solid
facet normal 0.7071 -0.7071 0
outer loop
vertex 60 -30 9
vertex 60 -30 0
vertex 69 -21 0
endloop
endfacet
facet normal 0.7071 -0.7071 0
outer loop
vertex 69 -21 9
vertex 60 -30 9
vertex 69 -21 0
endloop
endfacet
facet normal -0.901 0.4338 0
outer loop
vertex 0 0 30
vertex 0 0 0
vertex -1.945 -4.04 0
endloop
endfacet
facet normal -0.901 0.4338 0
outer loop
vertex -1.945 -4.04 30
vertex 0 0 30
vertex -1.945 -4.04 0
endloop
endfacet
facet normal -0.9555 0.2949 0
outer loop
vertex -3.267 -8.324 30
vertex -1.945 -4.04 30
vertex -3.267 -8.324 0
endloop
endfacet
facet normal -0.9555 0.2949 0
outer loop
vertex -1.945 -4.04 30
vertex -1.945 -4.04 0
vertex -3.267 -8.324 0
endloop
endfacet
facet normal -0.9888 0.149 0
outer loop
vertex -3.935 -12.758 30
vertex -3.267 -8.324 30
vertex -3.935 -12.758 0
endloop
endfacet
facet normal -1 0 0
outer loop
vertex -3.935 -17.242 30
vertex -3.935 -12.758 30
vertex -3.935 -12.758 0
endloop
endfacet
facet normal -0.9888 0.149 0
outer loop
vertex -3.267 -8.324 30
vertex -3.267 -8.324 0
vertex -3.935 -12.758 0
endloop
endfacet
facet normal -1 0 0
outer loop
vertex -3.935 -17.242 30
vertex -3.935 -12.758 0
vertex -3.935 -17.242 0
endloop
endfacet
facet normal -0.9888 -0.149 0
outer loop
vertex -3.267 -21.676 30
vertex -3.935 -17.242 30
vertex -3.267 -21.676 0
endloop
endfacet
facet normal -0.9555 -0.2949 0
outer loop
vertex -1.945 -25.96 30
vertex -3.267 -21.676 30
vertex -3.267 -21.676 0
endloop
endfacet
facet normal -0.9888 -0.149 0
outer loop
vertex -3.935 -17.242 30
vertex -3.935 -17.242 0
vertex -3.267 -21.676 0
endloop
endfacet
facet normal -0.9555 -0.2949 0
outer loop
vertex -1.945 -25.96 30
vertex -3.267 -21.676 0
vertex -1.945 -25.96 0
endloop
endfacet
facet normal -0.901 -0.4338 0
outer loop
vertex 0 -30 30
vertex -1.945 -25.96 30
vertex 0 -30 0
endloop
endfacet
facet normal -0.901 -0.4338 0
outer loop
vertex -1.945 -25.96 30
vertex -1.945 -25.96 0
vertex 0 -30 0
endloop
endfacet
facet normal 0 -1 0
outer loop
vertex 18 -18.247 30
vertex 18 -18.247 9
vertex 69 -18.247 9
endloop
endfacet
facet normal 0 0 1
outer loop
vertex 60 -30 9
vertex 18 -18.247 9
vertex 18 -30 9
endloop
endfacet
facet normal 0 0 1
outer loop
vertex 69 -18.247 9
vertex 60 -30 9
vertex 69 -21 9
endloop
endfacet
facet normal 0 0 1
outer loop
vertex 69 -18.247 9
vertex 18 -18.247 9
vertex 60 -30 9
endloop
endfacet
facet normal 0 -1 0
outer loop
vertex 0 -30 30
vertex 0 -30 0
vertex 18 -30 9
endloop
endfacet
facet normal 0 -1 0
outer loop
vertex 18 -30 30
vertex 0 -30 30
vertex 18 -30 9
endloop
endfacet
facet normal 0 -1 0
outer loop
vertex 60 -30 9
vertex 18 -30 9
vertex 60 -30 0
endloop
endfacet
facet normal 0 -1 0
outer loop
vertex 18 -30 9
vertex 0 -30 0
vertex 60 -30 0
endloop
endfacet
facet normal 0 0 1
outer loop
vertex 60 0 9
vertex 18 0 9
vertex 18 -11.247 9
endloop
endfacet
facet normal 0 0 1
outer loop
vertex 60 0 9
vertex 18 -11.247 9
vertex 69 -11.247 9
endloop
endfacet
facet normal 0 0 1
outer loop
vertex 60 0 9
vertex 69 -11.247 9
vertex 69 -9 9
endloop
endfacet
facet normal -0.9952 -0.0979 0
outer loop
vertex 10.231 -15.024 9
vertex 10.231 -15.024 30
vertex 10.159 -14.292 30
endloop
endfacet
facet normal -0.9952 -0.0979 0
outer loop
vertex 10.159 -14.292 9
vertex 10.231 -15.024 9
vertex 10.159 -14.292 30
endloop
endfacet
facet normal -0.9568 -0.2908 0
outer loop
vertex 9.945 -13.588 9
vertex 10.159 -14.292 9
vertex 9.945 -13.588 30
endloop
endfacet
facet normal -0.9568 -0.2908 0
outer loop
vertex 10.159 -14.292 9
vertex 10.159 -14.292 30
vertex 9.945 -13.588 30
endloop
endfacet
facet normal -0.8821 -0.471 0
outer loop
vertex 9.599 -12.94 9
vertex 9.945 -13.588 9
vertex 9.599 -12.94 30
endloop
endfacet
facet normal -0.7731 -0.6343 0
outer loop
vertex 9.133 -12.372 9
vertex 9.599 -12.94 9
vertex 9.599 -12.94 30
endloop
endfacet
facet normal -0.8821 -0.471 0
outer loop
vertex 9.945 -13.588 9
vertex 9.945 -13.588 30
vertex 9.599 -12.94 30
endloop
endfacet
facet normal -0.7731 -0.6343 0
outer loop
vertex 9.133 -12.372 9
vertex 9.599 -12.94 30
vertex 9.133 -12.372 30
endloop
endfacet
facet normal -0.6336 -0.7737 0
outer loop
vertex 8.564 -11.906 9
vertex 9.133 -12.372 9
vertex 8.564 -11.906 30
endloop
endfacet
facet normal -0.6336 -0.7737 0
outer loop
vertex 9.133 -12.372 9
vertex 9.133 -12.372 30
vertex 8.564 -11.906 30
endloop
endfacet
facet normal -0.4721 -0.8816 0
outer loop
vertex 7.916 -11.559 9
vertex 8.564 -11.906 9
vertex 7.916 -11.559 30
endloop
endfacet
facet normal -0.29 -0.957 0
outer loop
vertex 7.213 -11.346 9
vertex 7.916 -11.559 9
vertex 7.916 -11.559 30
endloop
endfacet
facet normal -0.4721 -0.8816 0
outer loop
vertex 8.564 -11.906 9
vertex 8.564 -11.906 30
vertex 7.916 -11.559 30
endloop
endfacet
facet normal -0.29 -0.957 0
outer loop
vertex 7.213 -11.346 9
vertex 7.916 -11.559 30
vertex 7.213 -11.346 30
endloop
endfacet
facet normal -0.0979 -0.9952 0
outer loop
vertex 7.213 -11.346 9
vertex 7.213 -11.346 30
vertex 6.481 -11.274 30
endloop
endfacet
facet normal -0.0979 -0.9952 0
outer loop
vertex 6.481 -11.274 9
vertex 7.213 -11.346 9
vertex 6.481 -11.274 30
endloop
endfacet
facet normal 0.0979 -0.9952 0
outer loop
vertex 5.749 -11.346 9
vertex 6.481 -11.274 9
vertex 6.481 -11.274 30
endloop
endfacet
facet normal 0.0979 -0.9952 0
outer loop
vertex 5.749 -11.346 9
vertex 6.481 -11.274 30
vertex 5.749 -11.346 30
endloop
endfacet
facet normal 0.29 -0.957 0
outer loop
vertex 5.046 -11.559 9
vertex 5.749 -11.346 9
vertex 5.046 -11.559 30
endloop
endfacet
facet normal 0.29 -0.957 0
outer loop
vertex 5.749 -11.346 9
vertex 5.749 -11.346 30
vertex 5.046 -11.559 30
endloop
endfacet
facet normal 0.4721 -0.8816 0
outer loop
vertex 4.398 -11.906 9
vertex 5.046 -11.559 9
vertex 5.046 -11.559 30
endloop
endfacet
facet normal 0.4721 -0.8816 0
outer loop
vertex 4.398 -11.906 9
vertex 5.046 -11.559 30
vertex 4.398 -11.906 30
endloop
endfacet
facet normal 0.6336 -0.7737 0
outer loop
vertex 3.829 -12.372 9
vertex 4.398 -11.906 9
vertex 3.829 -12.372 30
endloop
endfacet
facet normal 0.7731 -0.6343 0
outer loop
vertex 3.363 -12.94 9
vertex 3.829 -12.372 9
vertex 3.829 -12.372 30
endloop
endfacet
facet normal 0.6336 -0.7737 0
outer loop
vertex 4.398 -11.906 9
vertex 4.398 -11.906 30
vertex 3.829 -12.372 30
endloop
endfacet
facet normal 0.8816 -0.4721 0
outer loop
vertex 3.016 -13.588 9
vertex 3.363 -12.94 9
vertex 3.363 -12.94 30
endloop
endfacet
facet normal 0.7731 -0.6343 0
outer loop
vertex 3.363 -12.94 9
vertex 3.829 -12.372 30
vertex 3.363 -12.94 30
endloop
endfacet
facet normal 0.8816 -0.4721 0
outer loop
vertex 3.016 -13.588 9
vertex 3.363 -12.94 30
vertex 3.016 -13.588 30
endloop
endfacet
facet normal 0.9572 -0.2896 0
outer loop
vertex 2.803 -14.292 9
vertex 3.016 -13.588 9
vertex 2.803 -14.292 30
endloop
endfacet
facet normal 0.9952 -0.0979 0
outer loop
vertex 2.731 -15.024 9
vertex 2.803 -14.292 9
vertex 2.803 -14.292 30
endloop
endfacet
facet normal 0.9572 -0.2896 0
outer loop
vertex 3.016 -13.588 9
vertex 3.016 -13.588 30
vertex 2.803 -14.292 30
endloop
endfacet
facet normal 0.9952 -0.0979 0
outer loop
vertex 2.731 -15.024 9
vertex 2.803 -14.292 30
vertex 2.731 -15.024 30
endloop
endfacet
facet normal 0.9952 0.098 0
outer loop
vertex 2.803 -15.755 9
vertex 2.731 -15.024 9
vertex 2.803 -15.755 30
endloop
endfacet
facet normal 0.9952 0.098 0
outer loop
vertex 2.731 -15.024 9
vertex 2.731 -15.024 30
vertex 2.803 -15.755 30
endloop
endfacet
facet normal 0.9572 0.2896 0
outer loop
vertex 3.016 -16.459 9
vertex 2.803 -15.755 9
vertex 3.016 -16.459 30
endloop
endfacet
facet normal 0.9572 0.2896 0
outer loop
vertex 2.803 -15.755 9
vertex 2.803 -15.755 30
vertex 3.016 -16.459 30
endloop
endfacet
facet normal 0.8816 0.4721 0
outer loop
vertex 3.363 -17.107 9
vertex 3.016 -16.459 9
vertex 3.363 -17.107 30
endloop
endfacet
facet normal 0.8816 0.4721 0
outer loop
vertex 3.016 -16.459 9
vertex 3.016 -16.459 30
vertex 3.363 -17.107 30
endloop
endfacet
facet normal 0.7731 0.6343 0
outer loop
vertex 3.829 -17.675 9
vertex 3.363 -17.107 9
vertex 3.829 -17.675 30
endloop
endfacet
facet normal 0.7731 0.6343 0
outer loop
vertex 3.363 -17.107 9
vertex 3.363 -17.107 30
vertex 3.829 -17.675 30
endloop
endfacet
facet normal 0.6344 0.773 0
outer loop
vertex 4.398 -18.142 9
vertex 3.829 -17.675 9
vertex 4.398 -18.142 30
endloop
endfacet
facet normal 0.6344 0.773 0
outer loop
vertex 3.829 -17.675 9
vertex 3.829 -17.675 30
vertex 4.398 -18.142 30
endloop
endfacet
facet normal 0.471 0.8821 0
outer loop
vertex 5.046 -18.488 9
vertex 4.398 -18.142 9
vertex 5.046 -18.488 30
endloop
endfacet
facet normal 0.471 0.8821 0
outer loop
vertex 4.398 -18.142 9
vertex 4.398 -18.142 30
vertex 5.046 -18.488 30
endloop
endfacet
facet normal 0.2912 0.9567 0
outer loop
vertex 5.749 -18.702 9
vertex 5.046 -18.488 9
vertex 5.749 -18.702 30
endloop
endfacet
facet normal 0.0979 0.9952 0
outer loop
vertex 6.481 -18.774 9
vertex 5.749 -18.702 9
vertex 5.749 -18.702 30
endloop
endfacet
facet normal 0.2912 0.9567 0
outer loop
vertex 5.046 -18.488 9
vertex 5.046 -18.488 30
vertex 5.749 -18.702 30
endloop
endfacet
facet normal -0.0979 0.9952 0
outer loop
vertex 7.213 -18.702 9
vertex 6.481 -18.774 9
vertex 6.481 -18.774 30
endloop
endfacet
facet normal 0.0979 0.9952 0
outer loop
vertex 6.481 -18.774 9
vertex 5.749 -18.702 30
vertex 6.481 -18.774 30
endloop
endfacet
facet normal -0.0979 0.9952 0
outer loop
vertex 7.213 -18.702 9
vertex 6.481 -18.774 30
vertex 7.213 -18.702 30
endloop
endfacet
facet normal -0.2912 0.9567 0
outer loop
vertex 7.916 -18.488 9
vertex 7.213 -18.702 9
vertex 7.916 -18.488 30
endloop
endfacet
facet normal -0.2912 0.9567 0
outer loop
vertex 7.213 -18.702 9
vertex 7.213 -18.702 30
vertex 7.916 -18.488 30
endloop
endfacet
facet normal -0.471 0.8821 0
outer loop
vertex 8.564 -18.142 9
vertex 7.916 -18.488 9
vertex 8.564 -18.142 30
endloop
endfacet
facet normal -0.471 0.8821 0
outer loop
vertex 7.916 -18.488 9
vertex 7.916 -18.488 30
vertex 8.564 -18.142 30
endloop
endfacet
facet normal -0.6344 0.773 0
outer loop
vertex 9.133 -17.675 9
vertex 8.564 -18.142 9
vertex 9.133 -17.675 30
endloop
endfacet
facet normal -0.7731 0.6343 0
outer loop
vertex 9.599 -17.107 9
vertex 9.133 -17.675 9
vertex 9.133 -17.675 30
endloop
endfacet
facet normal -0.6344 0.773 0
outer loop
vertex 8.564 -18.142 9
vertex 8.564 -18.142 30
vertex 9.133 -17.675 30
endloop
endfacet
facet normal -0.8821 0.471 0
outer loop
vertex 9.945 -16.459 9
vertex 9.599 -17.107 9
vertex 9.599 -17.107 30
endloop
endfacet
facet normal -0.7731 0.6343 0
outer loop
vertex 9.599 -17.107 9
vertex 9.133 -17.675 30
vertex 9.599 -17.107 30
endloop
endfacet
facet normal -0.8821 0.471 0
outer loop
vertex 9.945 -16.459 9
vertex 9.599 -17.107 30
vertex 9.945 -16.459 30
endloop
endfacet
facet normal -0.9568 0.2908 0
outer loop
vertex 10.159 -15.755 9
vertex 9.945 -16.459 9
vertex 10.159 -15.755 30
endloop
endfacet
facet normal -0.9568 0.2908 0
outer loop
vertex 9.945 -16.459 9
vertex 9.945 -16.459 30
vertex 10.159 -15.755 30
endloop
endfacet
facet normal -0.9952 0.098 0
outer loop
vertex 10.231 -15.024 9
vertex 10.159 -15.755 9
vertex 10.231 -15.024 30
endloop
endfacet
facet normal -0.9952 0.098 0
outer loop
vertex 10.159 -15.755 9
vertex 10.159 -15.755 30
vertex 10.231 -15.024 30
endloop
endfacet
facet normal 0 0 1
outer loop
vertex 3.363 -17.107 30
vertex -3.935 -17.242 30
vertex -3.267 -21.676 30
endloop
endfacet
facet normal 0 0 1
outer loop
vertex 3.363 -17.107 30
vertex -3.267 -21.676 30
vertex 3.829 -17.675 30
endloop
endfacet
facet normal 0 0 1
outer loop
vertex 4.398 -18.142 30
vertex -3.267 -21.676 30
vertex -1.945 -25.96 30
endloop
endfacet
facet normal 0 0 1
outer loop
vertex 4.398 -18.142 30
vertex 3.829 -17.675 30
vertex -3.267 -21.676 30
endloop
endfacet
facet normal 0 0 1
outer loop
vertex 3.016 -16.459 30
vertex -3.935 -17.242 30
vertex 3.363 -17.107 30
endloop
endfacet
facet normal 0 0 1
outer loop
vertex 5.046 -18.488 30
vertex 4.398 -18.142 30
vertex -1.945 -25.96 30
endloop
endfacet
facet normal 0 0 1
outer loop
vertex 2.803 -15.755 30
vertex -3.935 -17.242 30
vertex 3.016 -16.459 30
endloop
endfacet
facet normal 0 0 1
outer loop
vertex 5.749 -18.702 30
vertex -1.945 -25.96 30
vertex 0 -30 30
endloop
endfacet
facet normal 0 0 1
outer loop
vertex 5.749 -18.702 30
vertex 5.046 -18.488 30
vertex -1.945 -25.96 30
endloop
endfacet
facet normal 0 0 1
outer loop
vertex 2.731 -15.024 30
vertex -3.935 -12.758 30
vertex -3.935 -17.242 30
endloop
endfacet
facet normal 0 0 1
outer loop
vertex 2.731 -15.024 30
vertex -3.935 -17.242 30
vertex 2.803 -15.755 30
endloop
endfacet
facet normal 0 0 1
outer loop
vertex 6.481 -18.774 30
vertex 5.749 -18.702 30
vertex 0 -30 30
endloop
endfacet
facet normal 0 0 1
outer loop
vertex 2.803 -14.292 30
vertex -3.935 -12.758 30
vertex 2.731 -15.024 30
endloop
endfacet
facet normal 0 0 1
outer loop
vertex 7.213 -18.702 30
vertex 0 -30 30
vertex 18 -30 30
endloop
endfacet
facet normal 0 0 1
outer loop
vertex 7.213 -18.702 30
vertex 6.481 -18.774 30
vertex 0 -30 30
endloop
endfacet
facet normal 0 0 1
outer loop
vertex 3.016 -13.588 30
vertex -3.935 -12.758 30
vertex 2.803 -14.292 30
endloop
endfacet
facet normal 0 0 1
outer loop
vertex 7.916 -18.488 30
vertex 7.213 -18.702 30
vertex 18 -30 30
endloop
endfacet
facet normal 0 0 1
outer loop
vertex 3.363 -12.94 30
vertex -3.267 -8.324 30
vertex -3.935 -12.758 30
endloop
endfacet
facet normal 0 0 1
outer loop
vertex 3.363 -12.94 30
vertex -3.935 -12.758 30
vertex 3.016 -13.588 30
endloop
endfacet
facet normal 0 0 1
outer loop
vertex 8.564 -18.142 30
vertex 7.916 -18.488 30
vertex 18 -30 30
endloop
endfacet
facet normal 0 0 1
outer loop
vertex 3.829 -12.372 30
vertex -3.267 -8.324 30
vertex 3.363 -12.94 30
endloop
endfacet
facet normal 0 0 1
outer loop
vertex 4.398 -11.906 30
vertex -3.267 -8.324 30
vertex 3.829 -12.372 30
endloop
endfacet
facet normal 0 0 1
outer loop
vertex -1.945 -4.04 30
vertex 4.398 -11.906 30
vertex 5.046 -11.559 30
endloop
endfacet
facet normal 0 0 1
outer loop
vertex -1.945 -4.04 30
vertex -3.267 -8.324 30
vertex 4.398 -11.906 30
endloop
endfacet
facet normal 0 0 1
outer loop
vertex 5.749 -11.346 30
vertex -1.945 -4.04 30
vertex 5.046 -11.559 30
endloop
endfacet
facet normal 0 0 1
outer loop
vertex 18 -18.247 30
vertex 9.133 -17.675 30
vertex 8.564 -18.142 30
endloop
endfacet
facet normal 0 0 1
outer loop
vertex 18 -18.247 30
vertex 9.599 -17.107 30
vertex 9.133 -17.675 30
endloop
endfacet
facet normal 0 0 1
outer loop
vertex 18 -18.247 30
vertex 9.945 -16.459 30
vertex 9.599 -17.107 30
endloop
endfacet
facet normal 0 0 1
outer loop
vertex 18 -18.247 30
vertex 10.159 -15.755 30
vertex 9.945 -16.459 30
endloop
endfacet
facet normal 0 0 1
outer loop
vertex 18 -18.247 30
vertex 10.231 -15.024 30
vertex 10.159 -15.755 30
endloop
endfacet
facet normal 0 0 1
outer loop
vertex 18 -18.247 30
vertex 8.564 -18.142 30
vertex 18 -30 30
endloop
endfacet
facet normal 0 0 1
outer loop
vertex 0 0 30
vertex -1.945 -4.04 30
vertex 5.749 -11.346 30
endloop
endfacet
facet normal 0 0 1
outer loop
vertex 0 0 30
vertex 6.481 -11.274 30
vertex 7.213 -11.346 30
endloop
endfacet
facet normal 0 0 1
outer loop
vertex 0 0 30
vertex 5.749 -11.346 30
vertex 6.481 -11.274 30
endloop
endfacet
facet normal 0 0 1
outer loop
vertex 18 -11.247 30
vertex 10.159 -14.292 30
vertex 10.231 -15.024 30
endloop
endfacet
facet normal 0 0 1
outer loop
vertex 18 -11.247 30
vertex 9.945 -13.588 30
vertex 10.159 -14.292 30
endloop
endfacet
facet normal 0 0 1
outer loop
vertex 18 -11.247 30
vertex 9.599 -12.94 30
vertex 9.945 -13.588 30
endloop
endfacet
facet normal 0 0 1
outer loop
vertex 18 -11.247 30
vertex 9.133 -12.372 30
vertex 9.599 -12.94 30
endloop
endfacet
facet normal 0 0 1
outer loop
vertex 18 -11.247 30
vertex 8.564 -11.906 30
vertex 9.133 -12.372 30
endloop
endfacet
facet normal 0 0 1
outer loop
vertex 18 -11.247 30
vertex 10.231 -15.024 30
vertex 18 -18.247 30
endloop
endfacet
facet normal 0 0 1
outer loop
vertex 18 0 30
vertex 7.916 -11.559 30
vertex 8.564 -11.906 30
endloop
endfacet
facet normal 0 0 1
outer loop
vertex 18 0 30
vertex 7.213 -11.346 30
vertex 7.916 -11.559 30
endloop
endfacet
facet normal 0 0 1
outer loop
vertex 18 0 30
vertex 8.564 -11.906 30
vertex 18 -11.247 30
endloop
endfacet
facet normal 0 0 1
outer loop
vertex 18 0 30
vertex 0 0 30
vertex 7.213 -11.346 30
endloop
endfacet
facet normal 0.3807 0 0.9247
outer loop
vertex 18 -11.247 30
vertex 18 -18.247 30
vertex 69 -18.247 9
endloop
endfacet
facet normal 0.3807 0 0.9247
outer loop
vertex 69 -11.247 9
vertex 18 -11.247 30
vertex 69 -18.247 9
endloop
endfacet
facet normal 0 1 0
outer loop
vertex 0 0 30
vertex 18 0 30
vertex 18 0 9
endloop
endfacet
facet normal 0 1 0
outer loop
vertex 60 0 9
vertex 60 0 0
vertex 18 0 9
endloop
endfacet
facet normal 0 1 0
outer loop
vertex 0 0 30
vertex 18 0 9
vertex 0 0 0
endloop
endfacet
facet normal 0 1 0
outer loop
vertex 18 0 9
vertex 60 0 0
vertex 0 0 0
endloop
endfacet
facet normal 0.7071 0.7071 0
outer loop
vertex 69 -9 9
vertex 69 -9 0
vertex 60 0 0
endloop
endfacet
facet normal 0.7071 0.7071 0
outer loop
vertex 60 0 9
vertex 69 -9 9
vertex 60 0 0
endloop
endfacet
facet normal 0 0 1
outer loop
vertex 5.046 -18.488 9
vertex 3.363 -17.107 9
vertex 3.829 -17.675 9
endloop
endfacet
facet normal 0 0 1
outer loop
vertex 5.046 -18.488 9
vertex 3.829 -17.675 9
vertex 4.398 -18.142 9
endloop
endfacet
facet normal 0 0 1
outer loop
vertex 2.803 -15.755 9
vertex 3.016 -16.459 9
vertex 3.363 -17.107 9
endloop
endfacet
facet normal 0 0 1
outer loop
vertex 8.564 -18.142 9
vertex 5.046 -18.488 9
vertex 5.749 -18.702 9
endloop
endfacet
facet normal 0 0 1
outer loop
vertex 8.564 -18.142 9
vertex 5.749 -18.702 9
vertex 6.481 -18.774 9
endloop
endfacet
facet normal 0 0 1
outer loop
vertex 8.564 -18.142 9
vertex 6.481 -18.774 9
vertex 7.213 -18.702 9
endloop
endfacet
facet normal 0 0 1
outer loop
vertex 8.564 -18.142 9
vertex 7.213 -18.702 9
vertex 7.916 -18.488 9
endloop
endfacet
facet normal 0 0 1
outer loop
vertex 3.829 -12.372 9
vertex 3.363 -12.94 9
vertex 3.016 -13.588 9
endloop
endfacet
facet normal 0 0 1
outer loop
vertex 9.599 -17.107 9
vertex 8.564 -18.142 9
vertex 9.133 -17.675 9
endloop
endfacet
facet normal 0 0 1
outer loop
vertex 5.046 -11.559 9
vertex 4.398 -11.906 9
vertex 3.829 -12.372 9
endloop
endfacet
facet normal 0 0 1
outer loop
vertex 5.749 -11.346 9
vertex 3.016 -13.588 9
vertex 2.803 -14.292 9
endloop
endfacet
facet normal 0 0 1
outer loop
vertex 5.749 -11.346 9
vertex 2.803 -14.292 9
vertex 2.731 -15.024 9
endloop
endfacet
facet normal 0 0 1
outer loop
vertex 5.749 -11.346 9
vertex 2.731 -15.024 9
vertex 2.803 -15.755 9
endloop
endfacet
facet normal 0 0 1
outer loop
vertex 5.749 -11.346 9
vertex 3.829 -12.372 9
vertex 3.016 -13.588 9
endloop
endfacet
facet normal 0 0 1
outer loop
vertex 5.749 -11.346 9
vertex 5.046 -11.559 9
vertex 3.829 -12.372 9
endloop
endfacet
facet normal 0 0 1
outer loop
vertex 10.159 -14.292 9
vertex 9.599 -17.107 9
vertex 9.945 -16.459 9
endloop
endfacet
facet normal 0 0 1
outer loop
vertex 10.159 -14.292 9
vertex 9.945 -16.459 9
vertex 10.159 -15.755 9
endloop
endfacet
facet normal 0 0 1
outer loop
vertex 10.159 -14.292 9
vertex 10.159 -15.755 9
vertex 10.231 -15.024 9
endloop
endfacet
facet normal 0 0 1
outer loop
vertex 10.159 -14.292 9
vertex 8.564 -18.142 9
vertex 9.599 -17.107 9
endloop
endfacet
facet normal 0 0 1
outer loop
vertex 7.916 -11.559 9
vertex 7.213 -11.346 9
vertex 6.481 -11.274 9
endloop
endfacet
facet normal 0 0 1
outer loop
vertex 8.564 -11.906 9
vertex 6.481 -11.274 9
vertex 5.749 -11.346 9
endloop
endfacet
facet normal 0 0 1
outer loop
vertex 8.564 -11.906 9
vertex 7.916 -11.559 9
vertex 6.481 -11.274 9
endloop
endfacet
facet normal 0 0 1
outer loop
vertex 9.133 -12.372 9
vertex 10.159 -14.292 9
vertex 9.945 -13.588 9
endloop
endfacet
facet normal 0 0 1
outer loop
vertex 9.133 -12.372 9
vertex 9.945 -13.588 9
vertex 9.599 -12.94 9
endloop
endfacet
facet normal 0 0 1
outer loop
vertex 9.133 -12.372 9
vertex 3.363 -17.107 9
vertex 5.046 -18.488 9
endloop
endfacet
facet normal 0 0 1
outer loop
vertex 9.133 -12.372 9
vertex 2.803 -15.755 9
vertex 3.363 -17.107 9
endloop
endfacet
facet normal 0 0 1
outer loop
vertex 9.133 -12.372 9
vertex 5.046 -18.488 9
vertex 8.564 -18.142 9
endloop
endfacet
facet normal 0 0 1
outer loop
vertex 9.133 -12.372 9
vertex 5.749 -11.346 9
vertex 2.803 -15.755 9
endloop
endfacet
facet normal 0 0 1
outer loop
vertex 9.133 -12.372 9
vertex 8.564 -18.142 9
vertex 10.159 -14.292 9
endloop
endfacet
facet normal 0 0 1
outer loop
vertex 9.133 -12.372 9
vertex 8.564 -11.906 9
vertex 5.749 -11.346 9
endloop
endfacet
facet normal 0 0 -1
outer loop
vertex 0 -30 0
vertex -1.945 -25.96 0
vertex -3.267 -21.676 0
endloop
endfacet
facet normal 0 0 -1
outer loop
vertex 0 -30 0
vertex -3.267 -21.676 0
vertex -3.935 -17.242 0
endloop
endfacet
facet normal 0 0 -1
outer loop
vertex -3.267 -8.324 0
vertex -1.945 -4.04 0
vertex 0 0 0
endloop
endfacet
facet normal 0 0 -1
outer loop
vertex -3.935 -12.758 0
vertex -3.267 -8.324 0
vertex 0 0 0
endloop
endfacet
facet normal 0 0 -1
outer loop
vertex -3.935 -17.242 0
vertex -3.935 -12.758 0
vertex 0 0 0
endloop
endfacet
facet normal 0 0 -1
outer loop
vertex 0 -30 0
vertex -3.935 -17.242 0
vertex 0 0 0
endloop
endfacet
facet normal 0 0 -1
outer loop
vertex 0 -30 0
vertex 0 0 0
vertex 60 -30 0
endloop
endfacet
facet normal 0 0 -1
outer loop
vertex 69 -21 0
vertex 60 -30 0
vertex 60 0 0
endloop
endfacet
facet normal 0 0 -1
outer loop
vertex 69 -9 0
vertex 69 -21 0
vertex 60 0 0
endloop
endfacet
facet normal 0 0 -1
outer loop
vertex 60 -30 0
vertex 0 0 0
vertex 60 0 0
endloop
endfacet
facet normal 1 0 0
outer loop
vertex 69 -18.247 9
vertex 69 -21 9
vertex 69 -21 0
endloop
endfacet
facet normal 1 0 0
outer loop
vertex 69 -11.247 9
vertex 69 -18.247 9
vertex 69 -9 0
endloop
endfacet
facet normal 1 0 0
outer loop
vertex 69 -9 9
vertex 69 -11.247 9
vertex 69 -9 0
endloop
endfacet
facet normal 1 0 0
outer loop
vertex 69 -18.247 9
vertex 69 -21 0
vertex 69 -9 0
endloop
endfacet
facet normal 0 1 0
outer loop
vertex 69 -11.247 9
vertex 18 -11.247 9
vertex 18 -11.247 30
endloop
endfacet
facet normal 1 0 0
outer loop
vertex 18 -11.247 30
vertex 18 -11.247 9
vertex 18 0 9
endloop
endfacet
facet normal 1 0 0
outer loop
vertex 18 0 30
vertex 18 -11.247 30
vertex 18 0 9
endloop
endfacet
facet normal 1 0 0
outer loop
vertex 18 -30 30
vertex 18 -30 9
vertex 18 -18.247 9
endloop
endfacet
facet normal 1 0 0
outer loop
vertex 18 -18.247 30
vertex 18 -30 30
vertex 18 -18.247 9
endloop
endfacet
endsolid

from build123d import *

# Parameters (mm, degrees)
F1_DEPTH = 9
F3_DEPTH = 21
F4_W     = 51
F4_H     = 7
F5_DEPTH = 21
F7_DEPTH = 25
F8_R     = 3.75
F9_DEPTH = 21


with BuildPart() as f1:
    # F0 (on Top) → F1 (new body)
    with BuildSketch(Plane.XY):
        with BuildLine():
            ThreePointArc((0, 0), (-4.019238, -15), (0, -30))
            Line((0, -30), (60, -30))
            Line((60, -30), (69, -21))
            Line((69, -21), (69, -9))
            Line((69, -9), (60, 0))
            Line((60, 0), (0, 0))
        make_face()
    extrude(amount=F1_DEPTH)

    # F2 (on face) → F3 (join)
    with BuildSketch(Plane.XY.offset(9)):
        with BuildLine():
            Line((0, -30), (18, -30))
            Line((18, -30), (18, 0))
            Line((18, 0), (0, 0))
            ThreePointArc((0, 0), (-4.019238, -15), (0, -30))
        make_face()
    extrude(amount=F3_DEPTH)

    # F4 (on face) → F5 (join)
    with BuildSketch(Plane.XY.offset(9)):
        with Locations((43.5, -14.746526)):
            Rectangle(F4_W, F4_H)
    extrude(amount=F5_DEPTH)

    # F6 (on face) → F7 (cut)
    with BuildSketch(Plane.XZ.offset(18.246526)):
        Polygon((69, 30), (18, 30), (69, 9), align=None)
    extrude(amount=-F7_DEPTH, mode=Mode.SUBTRACT)

    # F8 (on face) → F9 (cut)
    with BuildSketch(Plane.XY.offset(30)):
        with Locations((6.480922, -15.023556)):
            Circle(F8_R)
    extrude(amount=-F9_DEPTH, mode=Mode.SUBTRACT)


solid = f1.part
